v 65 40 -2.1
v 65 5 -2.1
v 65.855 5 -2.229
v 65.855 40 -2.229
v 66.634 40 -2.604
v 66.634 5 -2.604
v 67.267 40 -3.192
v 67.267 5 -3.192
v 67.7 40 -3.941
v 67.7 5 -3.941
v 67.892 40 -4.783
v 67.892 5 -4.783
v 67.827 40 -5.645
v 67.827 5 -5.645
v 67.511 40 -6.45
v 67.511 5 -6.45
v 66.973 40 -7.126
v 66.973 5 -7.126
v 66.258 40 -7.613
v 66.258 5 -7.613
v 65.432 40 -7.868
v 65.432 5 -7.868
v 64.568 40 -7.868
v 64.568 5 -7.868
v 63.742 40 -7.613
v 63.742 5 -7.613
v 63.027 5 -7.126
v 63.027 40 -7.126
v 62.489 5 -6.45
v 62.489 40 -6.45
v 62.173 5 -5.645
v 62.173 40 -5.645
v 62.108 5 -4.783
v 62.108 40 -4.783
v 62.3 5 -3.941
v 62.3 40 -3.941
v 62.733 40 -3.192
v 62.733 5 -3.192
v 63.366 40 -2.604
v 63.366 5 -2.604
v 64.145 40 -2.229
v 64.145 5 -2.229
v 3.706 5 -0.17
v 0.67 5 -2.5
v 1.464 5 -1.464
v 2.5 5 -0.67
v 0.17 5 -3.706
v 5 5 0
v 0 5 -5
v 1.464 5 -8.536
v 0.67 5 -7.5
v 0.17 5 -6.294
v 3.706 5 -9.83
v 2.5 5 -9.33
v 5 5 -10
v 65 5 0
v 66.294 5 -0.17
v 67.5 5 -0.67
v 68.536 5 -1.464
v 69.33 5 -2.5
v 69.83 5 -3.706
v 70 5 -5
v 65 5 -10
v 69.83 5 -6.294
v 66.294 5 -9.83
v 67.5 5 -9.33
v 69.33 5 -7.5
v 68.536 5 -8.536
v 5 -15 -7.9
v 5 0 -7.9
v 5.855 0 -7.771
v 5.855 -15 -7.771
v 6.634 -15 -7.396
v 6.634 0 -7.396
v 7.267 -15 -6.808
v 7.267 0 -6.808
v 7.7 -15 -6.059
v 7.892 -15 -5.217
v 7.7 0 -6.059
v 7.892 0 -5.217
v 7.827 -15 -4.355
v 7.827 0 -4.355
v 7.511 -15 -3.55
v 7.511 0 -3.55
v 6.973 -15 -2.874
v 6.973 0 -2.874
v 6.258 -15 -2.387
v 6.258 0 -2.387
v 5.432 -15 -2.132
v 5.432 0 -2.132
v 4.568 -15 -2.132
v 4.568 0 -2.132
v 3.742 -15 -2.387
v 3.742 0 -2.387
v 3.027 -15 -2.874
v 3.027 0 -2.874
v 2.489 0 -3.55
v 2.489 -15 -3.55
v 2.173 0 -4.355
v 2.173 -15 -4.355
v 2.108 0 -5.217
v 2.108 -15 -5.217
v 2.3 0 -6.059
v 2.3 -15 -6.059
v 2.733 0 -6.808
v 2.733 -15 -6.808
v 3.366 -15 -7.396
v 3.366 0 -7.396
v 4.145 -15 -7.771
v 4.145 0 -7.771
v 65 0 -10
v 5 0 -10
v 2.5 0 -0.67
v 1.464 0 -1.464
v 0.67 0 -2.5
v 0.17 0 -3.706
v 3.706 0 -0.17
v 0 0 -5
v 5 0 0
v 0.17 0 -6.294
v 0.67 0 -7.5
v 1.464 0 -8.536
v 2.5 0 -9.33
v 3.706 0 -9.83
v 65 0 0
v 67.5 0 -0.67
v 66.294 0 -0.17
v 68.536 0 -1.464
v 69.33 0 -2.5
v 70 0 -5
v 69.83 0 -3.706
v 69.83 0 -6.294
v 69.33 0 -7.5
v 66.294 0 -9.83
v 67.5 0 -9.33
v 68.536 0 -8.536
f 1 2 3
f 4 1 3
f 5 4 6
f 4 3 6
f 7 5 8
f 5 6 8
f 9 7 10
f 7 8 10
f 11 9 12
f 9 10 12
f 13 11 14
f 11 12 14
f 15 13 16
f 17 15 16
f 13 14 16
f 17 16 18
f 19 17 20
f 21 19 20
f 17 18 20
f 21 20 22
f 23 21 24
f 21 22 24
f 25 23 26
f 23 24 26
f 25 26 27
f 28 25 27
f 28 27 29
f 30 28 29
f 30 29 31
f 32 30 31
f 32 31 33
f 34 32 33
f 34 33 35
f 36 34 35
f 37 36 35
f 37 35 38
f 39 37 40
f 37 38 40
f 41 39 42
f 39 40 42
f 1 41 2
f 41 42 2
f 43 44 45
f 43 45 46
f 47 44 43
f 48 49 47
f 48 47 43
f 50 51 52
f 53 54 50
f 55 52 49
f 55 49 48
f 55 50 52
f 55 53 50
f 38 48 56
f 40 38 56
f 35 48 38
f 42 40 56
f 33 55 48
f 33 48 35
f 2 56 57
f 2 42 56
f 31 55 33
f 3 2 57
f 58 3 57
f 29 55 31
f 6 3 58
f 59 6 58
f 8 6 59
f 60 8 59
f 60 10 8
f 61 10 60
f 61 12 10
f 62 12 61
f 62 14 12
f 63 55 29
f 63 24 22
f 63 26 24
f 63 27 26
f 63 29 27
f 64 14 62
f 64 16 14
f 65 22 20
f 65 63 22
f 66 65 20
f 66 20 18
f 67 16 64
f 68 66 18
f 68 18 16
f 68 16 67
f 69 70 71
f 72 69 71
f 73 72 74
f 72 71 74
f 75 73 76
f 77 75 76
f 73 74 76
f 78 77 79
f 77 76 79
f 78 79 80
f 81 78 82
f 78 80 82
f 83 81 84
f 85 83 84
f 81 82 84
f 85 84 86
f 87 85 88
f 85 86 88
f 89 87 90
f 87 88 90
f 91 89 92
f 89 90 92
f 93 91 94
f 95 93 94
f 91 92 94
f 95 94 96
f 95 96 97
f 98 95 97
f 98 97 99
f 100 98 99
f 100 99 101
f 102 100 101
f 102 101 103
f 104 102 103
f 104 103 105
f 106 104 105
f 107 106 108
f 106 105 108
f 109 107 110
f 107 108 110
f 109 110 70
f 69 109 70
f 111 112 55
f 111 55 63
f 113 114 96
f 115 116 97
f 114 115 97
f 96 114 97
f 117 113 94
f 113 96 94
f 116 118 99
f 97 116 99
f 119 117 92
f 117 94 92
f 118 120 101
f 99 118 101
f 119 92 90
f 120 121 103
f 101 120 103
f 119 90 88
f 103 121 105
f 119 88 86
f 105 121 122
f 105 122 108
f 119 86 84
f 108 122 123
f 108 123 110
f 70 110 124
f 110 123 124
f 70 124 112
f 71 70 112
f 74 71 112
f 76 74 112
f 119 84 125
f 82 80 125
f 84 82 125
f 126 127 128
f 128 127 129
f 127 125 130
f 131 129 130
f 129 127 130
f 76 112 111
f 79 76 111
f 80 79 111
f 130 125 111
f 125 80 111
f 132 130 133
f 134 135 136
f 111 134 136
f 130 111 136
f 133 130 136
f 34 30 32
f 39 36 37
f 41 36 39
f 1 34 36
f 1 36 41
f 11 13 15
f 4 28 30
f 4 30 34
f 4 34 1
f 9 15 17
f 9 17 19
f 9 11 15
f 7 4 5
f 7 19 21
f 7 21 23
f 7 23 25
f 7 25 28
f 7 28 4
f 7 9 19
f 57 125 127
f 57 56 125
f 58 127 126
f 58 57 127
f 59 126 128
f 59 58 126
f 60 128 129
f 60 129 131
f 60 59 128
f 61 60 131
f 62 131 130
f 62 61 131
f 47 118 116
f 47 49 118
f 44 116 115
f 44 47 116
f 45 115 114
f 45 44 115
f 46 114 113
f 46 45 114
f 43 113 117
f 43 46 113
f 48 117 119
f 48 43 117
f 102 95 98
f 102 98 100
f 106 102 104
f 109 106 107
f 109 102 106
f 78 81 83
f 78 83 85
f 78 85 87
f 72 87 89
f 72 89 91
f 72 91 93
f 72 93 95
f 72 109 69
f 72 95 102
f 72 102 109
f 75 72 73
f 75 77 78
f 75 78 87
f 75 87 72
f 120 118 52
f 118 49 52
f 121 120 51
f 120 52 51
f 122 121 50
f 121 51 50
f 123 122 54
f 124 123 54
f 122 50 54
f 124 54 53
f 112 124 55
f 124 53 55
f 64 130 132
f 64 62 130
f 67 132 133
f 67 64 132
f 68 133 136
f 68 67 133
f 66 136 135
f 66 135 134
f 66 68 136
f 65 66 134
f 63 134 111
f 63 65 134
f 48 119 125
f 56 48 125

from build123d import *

# Parameters (mm, degrees)
SKETCH1_W           = 70
SKETCH1_H           = 10
BOSS_EXTRUDE1_DEPTH = 5
FILLET1_R           = 5
SKETCH2_R           = 2.9
BOSS_EXTRUDE2_DEPTH = 15
SKETCH3_R           = 2.9
BOSS_EXTRUDE3_DEPTH = 35


with BuildPart() as part:
    # Sketch1 → Boss-Extrude1 (new body)
    with BuildSketch(Plane(origin=(0, 0, 0), x_dir=(1, 0, 0), z_dir=(0, 1, 0))):
        with Locations((35, 5)):
            Rectangle(SKETCH1_W, SKETCH1_H)
    extrude(amount=BOSS_EXTRUDE1_DEPTH)

    # Fillet1
    fillet1_edges = [part.edges().sort_by_distance(p)[0] for p in [
        (70, 2.5, -10),
        (70, 2.5, 0),
        (0, 2.5, -10),
        (0, 2.5, 0),
    ]]
    fillet(fillet1_edges, radius=FILLET1_R - 0.0001)  # a hair under: the kernel refuses the full size

    # Sketch2 → Boss-Extrude2 (add)
    with BuildSketch(Plane.XZ):
        with Locations(Location((5, -5, 0), (0, 0, 270))):
            Circle(SKETCH2_R)
    extrude(amount=BOSS_EXTRUDE2_DEPTH)

    # Sketch3 → Boss-Extrude3 (add)
    with BuildSketch(Plane(origin=(0, 5, 0), x_dir=(1, 0, 0), z_dir=(0, 1, 0))):
        with Locations(Location((65, 5, 0), (0, 0, 270))):
            Circle(SKETCH3_R)
    extrude(amount=BOSS_EXTRUDE3_DEPTH)


solid = part.part
